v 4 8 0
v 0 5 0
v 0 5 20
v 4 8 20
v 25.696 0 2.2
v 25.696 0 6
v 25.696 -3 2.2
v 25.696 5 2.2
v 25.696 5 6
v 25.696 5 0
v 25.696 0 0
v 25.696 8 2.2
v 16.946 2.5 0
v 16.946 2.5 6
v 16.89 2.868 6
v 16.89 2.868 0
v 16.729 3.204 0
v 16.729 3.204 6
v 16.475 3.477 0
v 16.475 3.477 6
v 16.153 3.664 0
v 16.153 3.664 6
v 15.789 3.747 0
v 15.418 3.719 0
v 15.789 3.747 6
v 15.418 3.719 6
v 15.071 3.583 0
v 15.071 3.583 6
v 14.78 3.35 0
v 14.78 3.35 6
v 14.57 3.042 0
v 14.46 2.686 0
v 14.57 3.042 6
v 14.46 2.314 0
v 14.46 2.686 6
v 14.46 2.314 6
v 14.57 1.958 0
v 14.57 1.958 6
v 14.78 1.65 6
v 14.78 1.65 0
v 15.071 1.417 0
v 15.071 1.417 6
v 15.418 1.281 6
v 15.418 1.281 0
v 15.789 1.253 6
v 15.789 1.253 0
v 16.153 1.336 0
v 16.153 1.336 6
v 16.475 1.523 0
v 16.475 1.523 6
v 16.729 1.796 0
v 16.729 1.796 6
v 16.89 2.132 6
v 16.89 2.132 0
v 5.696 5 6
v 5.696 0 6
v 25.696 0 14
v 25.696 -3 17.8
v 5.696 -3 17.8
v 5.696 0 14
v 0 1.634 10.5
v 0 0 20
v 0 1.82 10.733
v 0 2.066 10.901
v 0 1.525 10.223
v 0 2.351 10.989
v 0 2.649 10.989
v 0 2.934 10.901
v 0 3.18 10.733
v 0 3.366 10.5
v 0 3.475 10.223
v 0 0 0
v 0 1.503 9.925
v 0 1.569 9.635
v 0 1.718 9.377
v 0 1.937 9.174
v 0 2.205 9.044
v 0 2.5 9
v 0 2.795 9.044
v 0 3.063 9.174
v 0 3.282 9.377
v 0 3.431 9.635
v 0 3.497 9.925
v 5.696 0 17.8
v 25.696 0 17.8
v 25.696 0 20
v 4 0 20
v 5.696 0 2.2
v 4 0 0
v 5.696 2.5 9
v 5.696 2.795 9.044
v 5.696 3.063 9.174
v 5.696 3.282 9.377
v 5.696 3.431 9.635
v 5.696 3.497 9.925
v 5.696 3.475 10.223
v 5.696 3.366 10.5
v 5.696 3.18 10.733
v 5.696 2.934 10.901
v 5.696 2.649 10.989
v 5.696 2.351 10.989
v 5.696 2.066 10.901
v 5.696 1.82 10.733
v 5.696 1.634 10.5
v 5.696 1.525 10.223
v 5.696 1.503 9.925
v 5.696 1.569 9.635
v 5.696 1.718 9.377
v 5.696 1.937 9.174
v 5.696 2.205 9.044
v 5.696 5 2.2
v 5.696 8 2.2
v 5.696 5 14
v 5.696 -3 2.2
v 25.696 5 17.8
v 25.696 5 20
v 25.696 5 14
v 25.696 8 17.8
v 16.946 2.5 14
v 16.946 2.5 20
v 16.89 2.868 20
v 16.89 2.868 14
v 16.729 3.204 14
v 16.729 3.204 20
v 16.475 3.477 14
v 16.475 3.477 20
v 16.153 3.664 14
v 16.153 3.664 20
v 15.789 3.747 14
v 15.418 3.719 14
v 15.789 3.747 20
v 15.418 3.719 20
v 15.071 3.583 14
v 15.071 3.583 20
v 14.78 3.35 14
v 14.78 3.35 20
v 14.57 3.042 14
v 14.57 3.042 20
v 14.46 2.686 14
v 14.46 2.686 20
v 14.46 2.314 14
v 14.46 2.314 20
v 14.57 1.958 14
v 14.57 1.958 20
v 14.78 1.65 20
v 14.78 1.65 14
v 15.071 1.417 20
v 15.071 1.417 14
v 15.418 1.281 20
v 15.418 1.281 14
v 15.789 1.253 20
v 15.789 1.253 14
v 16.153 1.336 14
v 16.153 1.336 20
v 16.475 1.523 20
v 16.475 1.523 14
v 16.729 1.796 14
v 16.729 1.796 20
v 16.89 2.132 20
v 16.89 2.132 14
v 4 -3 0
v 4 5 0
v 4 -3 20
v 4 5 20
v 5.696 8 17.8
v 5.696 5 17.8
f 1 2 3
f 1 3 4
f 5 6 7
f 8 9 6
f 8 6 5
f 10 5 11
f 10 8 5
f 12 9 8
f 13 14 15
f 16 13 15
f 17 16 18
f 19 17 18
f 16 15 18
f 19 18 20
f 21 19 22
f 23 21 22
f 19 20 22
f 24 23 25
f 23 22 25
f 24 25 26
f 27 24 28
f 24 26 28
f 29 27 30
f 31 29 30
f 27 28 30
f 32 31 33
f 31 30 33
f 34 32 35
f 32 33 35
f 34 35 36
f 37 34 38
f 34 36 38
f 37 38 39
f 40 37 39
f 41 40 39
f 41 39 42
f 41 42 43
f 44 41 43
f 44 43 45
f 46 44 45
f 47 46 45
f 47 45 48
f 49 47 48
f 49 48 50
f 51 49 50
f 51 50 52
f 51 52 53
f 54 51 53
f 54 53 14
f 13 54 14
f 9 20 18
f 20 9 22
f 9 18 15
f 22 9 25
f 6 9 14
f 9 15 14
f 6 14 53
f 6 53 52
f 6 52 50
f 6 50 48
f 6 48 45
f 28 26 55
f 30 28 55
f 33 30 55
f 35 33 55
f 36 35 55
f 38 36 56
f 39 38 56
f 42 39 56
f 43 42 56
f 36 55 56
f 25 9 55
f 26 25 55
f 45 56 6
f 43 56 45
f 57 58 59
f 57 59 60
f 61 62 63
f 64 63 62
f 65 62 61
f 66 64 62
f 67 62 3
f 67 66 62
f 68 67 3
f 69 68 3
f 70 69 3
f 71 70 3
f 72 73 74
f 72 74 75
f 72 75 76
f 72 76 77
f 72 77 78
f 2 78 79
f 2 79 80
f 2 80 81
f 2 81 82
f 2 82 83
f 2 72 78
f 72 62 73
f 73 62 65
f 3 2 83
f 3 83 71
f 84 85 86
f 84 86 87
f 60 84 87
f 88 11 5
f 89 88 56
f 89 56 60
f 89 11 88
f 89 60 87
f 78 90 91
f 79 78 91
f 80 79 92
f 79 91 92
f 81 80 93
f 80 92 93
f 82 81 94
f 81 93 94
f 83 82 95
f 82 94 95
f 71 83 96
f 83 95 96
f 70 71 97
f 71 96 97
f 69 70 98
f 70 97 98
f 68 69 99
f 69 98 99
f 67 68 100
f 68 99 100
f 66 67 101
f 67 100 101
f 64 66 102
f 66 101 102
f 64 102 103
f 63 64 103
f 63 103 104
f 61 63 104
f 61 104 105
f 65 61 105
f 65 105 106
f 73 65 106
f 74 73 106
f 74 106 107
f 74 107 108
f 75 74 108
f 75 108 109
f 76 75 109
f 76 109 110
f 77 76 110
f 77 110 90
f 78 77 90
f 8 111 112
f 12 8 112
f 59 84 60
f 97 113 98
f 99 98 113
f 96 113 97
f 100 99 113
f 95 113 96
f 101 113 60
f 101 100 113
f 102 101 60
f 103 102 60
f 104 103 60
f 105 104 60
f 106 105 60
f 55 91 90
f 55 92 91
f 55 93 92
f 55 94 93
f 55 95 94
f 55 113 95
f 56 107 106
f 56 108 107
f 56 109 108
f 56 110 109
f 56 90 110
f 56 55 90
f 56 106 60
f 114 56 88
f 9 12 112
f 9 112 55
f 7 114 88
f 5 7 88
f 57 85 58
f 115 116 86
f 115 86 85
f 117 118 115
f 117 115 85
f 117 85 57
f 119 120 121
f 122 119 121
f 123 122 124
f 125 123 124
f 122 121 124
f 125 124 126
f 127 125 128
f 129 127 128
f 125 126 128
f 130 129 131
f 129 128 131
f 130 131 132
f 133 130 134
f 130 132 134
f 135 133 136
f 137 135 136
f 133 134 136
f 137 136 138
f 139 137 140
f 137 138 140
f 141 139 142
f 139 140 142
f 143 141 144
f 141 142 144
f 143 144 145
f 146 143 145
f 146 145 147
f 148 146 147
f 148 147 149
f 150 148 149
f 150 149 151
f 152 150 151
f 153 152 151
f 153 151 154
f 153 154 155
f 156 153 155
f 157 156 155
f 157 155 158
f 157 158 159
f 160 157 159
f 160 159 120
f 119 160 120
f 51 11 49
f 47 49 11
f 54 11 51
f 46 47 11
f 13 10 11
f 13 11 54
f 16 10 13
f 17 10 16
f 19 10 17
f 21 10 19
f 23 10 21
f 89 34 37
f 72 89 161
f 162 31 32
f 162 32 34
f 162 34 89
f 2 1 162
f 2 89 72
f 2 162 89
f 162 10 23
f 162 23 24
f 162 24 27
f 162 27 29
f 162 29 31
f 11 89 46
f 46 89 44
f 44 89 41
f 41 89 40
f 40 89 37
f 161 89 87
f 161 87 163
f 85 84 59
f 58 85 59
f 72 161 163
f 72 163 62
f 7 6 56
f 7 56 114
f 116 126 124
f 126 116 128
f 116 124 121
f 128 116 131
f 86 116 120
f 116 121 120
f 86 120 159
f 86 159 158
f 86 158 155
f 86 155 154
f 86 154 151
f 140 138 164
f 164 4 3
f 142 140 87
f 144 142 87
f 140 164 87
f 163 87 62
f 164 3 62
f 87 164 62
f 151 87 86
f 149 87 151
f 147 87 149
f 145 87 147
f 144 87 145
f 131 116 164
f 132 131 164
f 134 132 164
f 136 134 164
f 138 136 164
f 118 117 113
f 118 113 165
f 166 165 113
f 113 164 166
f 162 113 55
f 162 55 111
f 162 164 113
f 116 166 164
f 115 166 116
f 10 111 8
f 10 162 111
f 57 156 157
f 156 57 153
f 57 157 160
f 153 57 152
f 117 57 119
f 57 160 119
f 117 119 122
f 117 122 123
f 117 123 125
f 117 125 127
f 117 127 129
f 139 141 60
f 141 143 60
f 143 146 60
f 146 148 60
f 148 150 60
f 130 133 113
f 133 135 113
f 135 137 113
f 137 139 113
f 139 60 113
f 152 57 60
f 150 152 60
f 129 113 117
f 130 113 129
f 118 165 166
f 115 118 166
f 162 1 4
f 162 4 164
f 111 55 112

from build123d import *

# Parameters (mm, degrees)
BOSS_EXTRU_1_DEPTH      = 20
ESQUISSE1_R             = 1
ENL_V_MAT_EXTRU_1_DEPTH = 6.695841166
BOSS_EXTRU_2_DEPTH      = 20
ESQUISSE3_R             = 1.25
ENL_V_MAT_EXTRU_2_DEPTH = 21


with BuildPart() as part:
    # ProfileRainureEsquisse → Boss.-Extru.1 (new body)
    with BuildSketch(Plane.XY):
        Polygon((0, 0), (0, 5), (4, 8), (4, 5), (5.695841166, 5), (5.695841166, 0), (4, 0), (4, -3), align=None)
    extrude(amount=BOSS_EXTRU_1_DEPTH)

    # Esquisse1 → Enlèv. mat.-Extru.1 (cut, through all)
    with BuildSketch(Plane(origin=(5.695841166, 0, 0), x_dir=(0, 0, -1), z_dir=(1, 0, 0))):
        with Locations((-10, 2.5)):
            Circle(ESQUISSE1_R)
    extrude(amount=-ENL_V_MAT_EXTRU_1_DEPTH, mode=Mode.SUBTRACT)

    # Esquisse2 → Boss.-Extru.2 (add)
    with BuildSketch(Plane(origin=(5.695841166, 0, 0), x_dir=(0, 0, -1), z_dir=(1, 0, 0))):
        Polygon((-14, 0), (-14, 5), (-17.8, 8), (-17.8, 5), (-20, 5), (-20, 0), (-17.8, 0), (-17.8, -3), align=None)
        Polygon((-6, 5), (-6, 0), (-2.2, -3), (-2.2, 0), (0, 0), (0, 5), (-2.2, 5), (-2.2, 8), align=None)
    extrude(amount=BOSS_EXTRU_2_DEPTH)

    # Esquisse3 → Enlèv. mat.-Extru.2 (cut, through all)
    with BuildSketch(Plane.XY.offset(20)):
        with Locations((15.695841166, 2.5)):
            Circle(ESQUISSE3_R)
    extrude(amount=-ENL_V_MAT_EXTRU_2_DEPTH, mode=Mode.SUBTRACT)


solid = part.part
